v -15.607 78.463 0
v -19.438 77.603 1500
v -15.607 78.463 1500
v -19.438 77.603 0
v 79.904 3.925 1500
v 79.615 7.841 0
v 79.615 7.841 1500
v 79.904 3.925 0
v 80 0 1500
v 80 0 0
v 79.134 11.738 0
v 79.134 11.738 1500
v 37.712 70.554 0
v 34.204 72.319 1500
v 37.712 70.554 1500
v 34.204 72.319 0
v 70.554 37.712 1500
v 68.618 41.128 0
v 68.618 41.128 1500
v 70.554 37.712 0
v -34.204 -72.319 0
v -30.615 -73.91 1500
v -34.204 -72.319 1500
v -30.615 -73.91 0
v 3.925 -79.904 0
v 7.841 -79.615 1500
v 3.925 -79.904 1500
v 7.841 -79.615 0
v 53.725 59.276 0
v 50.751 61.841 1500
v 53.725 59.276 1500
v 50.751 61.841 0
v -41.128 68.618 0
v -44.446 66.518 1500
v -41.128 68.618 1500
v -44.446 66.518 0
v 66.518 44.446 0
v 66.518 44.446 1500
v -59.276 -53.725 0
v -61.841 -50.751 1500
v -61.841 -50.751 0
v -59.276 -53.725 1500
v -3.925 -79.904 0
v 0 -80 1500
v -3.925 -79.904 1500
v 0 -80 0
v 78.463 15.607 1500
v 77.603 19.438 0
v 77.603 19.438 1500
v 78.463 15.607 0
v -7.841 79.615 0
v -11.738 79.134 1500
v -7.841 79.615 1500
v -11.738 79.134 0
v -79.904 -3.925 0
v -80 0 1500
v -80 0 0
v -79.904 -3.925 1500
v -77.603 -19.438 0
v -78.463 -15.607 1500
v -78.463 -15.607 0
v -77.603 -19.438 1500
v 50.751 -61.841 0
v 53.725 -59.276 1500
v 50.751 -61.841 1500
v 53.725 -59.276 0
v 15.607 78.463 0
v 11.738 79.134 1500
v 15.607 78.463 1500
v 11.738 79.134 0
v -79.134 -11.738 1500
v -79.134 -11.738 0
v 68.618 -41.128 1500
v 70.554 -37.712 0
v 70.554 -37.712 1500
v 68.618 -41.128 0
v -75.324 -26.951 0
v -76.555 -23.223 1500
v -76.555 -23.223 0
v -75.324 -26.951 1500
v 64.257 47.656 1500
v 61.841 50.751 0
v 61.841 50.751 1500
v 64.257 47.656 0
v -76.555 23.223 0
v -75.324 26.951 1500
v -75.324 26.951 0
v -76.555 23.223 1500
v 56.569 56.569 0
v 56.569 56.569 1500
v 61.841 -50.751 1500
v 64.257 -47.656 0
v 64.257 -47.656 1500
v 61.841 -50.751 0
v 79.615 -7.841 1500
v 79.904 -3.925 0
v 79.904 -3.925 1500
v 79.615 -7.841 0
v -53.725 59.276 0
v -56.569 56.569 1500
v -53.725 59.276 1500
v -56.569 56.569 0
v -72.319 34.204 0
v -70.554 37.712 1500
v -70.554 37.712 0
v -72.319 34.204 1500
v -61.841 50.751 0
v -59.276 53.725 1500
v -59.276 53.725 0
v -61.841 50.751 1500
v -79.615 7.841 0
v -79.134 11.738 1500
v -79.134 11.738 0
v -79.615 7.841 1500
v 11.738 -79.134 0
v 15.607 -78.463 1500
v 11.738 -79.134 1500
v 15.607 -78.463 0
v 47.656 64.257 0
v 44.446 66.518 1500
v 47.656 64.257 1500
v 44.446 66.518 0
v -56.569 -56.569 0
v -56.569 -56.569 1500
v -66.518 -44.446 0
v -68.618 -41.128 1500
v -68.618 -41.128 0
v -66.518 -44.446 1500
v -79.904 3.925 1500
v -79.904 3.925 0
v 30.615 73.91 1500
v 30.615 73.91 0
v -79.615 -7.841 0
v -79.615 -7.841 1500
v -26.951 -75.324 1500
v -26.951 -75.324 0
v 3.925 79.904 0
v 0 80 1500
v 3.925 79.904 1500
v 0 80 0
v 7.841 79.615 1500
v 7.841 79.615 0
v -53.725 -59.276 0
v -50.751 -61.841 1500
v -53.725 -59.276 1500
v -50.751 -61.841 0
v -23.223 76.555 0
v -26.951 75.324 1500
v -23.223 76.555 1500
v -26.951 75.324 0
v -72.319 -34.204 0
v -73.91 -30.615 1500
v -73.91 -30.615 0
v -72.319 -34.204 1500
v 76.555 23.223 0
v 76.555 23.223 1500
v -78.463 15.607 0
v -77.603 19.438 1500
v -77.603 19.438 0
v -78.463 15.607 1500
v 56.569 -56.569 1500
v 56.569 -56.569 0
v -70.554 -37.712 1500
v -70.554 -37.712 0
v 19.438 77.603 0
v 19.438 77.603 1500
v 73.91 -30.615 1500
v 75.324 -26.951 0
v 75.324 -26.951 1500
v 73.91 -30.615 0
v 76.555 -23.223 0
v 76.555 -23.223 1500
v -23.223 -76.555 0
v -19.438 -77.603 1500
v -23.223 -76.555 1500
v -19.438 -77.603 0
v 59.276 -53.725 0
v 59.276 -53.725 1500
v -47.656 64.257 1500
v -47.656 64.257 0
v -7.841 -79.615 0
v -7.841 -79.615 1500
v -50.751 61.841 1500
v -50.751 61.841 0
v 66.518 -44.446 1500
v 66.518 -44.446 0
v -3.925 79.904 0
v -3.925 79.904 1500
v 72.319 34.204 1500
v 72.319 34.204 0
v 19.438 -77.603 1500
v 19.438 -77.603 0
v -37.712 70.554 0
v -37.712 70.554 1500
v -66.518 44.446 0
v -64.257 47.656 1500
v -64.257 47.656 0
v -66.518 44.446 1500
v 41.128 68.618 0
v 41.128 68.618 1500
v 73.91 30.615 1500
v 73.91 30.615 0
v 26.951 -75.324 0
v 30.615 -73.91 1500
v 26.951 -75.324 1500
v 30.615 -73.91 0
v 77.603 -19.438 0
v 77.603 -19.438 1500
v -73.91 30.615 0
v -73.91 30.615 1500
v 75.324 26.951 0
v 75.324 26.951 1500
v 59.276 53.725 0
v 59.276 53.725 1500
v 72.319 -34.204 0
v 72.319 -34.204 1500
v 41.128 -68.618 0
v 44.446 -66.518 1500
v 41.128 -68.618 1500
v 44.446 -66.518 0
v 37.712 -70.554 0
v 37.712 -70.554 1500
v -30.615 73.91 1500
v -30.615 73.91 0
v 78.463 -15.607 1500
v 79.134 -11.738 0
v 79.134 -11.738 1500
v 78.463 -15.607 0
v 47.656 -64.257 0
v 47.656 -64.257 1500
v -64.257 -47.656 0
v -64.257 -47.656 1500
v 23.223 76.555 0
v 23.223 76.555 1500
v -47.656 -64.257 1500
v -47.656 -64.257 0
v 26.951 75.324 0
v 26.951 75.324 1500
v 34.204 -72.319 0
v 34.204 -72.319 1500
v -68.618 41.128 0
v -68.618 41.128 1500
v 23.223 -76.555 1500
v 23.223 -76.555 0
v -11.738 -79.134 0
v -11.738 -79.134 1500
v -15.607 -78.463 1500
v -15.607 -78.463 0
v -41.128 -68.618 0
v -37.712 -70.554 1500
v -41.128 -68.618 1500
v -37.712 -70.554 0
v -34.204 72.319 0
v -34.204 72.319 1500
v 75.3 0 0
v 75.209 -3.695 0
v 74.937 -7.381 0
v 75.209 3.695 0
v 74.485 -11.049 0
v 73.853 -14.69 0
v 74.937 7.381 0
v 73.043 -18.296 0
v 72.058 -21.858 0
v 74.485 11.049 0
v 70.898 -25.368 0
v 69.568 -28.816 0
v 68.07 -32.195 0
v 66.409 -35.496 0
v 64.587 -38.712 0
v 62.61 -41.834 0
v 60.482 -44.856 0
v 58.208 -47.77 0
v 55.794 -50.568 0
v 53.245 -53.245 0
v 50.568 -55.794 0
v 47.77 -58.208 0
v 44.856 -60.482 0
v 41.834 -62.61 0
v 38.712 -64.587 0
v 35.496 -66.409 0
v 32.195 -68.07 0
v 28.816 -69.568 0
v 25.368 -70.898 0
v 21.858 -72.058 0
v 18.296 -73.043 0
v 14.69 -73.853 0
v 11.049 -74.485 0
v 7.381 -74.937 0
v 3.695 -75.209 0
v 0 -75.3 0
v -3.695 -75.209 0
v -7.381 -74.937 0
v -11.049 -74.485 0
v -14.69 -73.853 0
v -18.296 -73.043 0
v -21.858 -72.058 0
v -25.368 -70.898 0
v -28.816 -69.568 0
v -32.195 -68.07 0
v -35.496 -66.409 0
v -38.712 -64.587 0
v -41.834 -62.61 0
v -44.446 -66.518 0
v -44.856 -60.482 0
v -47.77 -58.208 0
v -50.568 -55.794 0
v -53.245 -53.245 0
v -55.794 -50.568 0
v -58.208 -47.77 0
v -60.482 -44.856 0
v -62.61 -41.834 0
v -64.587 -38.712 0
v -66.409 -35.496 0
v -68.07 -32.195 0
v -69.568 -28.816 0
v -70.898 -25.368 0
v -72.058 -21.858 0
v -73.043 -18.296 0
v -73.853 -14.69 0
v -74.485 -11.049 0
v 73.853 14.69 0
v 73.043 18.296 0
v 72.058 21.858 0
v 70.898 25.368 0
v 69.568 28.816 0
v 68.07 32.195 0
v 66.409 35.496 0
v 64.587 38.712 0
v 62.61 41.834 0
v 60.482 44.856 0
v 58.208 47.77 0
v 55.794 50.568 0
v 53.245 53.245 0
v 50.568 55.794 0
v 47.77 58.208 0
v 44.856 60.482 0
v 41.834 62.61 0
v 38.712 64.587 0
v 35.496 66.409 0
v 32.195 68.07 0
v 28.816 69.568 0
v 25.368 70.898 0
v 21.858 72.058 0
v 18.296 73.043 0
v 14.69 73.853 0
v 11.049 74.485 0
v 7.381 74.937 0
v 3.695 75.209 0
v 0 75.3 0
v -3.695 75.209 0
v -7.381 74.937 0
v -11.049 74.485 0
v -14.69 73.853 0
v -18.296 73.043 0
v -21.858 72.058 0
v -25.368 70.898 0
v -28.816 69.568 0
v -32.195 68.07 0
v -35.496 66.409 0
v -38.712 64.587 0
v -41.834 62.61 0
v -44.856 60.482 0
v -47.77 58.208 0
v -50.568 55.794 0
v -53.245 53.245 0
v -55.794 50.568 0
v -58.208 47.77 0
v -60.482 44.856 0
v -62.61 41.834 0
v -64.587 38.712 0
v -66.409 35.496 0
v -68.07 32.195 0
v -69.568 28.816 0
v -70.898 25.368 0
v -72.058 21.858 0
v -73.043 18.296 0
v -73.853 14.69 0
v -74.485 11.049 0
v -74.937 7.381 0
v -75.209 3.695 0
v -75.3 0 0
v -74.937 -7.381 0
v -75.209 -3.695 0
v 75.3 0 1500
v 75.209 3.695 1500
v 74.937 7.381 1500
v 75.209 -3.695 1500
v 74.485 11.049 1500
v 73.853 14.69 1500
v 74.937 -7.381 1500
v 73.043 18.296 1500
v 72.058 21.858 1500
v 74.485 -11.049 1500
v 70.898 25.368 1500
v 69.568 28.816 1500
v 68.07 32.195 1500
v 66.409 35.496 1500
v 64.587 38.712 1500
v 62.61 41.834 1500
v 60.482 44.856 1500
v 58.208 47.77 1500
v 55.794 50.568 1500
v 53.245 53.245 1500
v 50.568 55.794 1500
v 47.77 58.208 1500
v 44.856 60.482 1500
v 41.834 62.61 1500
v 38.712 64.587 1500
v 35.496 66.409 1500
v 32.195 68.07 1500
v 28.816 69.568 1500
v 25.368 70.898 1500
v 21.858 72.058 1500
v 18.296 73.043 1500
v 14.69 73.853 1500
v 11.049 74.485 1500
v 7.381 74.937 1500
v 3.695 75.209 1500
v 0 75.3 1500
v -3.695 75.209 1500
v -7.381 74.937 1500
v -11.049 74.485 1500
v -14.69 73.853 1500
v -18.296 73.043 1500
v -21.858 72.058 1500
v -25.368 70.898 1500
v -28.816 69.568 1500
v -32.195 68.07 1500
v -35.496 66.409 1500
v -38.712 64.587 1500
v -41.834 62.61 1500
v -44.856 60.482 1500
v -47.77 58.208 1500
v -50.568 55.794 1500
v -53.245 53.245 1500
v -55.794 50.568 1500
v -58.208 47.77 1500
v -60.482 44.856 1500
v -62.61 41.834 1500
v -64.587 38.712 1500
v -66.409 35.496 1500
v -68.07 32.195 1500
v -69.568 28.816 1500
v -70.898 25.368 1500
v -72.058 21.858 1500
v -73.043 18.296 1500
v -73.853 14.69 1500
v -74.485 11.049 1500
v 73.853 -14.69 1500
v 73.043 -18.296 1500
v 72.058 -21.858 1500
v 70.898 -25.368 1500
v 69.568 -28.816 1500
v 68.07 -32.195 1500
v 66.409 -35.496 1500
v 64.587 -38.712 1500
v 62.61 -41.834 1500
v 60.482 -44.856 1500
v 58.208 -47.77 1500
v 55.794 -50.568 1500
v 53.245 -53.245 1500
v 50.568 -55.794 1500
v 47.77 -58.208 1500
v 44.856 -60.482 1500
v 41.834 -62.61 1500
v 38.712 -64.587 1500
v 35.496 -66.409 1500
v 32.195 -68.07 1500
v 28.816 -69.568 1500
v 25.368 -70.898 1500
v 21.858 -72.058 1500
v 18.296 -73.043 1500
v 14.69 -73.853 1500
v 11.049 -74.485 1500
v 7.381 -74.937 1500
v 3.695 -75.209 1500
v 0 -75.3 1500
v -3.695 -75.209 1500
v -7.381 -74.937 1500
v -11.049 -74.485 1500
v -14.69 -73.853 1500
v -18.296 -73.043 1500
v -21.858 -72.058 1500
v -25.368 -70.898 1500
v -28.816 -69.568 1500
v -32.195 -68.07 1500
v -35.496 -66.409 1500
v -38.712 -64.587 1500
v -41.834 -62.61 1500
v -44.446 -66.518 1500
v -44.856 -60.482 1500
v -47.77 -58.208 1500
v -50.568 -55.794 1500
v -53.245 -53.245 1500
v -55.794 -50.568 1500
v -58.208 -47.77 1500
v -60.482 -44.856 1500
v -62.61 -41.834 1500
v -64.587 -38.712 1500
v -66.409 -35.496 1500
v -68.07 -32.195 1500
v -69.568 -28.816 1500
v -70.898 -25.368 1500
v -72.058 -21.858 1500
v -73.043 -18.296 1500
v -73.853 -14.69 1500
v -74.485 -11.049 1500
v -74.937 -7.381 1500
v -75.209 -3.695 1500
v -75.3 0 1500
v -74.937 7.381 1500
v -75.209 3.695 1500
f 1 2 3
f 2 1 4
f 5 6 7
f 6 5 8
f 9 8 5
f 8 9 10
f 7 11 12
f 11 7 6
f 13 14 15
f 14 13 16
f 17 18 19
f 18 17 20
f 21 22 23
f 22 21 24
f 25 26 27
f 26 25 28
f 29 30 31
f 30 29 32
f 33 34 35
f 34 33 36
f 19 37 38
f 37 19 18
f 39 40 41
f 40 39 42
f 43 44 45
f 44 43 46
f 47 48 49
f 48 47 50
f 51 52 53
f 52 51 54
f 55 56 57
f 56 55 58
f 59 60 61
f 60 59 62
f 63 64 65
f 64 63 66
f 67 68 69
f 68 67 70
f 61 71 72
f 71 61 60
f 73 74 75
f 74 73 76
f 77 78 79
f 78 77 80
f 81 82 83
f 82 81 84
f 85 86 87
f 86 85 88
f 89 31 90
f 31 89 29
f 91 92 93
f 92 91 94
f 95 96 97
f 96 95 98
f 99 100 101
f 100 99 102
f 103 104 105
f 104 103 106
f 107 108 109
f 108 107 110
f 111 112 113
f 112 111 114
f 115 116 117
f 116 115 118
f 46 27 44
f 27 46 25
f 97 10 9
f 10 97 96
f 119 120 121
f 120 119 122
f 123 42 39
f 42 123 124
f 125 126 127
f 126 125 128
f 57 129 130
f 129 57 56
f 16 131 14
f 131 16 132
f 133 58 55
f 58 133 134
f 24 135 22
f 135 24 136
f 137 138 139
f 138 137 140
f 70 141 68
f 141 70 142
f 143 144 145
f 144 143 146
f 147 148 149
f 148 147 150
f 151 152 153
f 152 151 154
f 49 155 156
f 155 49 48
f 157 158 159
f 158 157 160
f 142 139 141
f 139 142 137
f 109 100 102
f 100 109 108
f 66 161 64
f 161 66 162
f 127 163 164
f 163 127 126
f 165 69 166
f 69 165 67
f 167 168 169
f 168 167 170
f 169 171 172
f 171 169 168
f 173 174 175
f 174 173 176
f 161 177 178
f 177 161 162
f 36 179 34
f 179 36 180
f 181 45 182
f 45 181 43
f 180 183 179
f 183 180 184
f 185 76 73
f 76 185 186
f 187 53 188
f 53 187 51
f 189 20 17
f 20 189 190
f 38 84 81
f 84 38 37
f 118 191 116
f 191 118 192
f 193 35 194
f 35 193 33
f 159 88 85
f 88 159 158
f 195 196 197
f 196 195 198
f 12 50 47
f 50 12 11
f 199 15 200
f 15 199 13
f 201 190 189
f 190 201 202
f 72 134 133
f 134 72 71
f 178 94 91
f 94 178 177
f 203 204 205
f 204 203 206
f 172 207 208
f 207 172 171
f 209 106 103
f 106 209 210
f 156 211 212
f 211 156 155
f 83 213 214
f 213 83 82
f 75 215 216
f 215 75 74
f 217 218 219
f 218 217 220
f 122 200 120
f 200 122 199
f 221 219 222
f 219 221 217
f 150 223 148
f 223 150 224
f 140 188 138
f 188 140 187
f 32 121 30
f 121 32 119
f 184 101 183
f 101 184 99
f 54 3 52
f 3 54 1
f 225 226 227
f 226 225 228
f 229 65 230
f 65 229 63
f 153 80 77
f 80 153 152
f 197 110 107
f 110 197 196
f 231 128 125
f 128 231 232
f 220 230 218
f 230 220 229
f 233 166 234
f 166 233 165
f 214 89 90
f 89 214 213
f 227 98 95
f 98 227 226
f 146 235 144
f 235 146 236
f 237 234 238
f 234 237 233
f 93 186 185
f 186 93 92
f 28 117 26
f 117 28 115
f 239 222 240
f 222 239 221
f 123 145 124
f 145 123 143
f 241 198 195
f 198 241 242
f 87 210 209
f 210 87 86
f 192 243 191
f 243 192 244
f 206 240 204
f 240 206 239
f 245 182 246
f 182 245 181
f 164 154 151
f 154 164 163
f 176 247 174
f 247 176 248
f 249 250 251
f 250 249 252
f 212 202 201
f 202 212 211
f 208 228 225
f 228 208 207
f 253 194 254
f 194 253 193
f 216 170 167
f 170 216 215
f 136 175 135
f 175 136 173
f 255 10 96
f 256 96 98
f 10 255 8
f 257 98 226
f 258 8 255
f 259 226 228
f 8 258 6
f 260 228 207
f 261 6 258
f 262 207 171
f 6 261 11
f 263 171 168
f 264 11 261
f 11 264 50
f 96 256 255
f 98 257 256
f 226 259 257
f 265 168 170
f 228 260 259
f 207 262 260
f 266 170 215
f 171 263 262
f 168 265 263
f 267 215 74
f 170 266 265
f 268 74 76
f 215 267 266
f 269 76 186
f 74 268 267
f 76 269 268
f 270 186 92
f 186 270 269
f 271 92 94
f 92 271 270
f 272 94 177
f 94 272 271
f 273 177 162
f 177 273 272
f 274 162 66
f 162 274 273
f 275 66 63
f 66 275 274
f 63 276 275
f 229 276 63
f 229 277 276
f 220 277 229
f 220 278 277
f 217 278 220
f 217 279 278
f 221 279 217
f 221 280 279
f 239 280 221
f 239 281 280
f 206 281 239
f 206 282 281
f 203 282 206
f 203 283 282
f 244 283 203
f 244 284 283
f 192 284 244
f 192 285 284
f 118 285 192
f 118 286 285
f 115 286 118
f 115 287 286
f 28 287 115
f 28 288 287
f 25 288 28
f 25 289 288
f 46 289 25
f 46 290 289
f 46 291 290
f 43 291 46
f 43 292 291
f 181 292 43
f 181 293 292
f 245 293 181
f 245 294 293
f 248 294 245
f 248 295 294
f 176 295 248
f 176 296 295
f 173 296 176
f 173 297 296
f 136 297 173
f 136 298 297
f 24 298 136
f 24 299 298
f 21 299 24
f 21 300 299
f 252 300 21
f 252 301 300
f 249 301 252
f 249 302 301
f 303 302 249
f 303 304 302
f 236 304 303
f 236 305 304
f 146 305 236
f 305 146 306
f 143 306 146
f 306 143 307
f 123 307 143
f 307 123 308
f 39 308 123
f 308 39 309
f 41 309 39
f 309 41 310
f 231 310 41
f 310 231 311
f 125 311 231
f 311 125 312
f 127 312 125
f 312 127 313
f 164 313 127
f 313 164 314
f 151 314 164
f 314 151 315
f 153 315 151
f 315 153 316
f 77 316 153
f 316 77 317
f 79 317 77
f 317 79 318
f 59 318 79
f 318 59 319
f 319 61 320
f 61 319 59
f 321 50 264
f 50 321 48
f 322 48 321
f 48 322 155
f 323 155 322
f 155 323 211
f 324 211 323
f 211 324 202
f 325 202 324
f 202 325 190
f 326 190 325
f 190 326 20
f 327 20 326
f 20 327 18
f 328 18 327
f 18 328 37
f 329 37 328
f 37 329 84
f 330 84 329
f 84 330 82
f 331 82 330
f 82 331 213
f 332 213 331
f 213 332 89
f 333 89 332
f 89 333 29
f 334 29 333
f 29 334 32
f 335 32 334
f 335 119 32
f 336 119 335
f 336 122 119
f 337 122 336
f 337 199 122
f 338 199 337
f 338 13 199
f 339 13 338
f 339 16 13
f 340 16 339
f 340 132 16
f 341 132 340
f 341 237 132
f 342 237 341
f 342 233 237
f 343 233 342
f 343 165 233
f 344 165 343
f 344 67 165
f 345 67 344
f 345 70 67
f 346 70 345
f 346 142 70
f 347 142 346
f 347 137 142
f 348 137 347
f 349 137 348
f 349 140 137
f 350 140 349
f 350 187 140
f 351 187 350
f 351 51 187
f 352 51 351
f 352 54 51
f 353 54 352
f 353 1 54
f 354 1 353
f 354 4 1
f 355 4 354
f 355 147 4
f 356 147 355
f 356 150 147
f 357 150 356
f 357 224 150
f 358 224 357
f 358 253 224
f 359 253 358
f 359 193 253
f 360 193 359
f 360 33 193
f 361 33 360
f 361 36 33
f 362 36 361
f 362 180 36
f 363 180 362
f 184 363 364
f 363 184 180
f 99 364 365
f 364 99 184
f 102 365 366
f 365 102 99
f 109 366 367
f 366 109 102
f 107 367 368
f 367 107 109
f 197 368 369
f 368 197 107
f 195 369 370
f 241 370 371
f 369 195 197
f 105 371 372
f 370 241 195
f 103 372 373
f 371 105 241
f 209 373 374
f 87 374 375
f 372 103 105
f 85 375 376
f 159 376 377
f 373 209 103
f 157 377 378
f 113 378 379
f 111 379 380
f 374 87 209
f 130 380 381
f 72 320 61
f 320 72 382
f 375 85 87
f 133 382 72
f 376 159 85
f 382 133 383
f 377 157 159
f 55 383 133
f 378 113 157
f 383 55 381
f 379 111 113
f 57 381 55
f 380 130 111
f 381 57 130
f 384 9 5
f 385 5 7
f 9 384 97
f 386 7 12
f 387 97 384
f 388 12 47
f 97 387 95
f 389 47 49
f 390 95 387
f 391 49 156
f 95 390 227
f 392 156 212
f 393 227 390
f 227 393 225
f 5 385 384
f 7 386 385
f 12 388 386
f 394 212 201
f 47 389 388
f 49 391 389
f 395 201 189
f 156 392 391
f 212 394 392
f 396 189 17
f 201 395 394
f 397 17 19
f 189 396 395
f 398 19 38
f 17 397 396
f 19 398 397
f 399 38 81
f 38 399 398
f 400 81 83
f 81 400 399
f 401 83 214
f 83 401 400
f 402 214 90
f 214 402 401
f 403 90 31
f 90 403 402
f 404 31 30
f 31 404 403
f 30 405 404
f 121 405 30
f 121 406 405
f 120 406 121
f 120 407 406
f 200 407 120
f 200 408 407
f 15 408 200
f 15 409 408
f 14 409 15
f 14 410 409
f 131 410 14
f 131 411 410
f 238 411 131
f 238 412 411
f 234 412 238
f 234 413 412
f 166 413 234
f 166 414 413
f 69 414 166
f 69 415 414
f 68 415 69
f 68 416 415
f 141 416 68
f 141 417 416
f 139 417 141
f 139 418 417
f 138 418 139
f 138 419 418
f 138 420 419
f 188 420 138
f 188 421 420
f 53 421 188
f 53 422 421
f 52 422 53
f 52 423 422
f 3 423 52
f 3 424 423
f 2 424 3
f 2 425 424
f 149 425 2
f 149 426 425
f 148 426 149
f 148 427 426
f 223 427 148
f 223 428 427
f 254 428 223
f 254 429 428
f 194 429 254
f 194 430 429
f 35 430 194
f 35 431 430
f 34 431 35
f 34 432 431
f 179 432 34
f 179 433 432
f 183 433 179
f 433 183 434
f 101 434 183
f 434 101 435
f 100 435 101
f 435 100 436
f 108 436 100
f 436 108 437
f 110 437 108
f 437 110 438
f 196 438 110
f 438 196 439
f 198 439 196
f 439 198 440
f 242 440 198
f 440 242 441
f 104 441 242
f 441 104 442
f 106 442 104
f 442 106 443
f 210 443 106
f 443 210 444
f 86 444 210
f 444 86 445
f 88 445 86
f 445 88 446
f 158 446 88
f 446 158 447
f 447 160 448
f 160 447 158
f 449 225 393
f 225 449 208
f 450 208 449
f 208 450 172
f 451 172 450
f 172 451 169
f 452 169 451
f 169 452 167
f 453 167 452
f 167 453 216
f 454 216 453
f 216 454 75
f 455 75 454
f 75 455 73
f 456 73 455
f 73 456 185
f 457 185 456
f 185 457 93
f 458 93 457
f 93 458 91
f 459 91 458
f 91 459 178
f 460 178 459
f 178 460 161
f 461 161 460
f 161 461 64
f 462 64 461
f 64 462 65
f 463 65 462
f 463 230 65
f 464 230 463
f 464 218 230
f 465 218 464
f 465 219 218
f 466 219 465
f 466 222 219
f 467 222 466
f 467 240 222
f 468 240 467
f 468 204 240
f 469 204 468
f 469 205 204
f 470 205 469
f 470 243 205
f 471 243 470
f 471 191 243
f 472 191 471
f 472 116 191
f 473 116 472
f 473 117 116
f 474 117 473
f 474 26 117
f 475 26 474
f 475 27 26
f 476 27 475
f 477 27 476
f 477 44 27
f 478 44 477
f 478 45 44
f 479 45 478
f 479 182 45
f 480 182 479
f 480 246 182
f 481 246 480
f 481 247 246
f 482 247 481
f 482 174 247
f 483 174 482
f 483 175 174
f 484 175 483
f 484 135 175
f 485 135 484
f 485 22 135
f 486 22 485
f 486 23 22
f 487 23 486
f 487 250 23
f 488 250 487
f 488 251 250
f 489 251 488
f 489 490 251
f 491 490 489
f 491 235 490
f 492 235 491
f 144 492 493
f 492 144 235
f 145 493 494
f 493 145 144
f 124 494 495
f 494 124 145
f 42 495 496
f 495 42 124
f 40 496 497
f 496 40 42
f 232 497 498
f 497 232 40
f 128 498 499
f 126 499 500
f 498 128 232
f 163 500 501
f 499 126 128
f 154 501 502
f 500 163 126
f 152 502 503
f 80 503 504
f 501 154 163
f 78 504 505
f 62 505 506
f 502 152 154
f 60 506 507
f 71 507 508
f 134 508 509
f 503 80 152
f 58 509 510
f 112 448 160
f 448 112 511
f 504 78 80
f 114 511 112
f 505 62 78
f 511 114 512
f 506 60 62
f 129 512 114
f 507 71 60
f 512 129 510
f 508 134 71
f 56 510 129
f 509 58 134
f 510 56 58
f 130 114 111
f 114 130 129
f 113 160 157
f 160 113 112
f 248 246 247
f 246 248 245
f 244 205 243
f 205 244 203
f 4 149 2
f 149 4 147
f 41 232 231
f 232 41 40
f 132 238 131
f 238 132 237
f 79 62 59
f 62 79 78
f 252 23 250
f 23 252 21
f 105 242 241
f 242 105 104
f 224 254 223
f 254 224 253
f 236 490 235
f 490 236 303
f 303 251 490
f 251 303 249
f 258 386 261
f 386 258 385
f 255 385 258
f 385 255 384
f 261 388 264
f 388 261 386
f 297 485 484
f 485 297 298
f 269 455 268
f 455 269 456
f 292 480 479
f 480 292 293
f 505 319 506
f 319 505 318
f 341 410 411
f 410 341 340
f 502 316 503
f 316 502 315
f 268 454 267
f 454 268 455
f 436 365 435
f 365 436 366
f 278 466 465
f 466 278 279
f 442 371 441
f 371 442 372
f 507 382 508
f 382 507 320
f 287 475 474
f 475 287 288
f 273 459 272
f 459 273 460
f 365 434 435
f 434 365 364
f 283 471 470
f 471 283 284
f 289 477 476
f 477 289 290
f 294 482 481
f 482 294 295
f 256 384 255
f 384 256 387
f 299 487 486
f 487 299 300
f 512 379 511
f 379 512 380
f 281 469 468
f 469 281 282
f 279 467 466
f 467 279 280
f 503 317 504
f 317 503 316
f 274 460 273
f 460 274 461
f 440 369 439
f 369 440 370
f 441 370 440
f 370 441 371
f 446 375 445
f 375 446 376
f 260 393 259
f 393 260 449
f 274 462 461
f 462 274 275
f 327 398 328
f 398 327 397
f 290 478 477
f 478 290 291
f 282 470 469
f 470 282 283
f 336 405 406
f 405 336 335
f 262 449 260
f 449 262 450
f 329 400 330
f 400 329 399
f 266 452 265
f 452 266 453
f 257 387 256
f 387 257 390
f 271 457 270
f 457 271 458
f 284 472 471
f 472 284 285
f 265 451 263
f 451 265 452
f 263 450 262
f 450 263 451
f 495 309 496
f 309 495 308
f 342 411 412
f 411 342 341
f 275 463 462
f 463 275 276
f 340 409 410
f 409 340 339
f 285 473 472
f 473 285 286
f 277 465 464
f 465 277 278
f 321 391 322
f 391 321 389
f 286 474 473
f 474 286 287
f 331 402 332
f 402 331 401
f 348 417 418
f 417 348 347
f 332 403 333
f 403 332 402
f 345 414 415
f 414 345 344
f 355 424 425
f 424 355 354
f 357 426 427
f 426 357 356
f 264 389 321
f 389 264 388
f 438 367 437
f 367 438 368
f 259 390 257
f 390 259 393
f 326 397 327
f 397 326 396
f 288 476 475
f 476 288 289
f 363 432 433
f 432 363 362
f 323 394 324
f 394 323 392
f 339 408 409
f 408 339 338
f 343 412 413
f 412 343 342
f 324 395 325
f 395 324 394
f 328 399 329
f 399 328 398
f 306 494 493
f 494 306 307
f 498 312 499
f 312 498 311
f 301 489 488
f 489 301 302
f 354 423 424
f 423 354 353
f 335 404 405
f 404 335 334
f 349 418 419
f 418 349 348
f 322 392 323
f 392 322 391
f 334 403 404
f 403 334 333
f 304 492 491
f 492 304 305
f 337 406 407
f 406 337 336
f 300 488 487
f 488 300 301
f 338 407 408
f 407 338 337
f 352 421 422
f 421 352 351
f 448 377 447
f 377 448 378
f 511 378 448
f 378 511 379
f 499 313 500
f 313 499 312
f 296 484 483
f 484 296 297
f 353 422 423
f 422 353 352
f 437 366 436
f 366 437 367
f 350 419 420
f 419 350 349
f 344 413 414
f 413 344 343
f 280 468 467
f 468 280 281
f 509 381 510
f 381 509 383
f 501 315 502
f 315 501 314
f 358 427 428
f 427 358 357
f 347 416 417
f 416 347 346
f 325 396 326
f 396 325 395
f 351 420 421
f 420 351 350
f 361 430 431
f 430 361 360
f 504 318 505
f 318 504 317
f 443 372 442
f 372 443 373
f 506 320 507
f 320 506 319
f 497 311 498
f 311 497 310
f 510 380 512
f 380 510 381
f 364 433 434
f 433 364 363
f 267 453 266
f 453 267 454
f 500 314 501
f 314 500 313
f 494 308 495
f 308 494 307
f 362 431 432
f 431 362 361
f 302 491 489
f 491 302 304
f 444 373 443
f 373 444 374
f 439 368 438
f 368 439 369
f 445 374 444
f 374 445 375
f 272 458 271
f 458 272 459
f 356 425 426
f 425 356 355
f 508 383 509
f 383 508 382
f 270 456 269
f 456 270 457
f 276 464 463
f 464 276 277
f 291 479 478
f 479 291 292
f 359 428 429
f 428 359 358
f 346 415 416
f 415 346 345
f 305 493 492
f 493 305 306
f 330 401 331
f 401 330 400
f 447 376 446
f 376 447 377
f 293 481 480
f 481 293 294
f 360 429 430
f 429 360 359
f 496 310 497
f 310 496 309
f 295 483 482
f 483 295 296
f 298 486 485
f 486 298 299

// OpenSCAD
$fn=128;

// HT pipe parameters (mm)
outer_d = 160;
length  = 1500;

// Typical HT (house drainage) wall thickness approximation (mm)
wall = 4.7;

inner_d = outer_d - 2*wall;

difference() {
    cylinder(h=length, d=outer_d, center=false);
    translate([0,0,-0.5])
        cylinder(h=length+1, d=inner_d, center=false);
}
